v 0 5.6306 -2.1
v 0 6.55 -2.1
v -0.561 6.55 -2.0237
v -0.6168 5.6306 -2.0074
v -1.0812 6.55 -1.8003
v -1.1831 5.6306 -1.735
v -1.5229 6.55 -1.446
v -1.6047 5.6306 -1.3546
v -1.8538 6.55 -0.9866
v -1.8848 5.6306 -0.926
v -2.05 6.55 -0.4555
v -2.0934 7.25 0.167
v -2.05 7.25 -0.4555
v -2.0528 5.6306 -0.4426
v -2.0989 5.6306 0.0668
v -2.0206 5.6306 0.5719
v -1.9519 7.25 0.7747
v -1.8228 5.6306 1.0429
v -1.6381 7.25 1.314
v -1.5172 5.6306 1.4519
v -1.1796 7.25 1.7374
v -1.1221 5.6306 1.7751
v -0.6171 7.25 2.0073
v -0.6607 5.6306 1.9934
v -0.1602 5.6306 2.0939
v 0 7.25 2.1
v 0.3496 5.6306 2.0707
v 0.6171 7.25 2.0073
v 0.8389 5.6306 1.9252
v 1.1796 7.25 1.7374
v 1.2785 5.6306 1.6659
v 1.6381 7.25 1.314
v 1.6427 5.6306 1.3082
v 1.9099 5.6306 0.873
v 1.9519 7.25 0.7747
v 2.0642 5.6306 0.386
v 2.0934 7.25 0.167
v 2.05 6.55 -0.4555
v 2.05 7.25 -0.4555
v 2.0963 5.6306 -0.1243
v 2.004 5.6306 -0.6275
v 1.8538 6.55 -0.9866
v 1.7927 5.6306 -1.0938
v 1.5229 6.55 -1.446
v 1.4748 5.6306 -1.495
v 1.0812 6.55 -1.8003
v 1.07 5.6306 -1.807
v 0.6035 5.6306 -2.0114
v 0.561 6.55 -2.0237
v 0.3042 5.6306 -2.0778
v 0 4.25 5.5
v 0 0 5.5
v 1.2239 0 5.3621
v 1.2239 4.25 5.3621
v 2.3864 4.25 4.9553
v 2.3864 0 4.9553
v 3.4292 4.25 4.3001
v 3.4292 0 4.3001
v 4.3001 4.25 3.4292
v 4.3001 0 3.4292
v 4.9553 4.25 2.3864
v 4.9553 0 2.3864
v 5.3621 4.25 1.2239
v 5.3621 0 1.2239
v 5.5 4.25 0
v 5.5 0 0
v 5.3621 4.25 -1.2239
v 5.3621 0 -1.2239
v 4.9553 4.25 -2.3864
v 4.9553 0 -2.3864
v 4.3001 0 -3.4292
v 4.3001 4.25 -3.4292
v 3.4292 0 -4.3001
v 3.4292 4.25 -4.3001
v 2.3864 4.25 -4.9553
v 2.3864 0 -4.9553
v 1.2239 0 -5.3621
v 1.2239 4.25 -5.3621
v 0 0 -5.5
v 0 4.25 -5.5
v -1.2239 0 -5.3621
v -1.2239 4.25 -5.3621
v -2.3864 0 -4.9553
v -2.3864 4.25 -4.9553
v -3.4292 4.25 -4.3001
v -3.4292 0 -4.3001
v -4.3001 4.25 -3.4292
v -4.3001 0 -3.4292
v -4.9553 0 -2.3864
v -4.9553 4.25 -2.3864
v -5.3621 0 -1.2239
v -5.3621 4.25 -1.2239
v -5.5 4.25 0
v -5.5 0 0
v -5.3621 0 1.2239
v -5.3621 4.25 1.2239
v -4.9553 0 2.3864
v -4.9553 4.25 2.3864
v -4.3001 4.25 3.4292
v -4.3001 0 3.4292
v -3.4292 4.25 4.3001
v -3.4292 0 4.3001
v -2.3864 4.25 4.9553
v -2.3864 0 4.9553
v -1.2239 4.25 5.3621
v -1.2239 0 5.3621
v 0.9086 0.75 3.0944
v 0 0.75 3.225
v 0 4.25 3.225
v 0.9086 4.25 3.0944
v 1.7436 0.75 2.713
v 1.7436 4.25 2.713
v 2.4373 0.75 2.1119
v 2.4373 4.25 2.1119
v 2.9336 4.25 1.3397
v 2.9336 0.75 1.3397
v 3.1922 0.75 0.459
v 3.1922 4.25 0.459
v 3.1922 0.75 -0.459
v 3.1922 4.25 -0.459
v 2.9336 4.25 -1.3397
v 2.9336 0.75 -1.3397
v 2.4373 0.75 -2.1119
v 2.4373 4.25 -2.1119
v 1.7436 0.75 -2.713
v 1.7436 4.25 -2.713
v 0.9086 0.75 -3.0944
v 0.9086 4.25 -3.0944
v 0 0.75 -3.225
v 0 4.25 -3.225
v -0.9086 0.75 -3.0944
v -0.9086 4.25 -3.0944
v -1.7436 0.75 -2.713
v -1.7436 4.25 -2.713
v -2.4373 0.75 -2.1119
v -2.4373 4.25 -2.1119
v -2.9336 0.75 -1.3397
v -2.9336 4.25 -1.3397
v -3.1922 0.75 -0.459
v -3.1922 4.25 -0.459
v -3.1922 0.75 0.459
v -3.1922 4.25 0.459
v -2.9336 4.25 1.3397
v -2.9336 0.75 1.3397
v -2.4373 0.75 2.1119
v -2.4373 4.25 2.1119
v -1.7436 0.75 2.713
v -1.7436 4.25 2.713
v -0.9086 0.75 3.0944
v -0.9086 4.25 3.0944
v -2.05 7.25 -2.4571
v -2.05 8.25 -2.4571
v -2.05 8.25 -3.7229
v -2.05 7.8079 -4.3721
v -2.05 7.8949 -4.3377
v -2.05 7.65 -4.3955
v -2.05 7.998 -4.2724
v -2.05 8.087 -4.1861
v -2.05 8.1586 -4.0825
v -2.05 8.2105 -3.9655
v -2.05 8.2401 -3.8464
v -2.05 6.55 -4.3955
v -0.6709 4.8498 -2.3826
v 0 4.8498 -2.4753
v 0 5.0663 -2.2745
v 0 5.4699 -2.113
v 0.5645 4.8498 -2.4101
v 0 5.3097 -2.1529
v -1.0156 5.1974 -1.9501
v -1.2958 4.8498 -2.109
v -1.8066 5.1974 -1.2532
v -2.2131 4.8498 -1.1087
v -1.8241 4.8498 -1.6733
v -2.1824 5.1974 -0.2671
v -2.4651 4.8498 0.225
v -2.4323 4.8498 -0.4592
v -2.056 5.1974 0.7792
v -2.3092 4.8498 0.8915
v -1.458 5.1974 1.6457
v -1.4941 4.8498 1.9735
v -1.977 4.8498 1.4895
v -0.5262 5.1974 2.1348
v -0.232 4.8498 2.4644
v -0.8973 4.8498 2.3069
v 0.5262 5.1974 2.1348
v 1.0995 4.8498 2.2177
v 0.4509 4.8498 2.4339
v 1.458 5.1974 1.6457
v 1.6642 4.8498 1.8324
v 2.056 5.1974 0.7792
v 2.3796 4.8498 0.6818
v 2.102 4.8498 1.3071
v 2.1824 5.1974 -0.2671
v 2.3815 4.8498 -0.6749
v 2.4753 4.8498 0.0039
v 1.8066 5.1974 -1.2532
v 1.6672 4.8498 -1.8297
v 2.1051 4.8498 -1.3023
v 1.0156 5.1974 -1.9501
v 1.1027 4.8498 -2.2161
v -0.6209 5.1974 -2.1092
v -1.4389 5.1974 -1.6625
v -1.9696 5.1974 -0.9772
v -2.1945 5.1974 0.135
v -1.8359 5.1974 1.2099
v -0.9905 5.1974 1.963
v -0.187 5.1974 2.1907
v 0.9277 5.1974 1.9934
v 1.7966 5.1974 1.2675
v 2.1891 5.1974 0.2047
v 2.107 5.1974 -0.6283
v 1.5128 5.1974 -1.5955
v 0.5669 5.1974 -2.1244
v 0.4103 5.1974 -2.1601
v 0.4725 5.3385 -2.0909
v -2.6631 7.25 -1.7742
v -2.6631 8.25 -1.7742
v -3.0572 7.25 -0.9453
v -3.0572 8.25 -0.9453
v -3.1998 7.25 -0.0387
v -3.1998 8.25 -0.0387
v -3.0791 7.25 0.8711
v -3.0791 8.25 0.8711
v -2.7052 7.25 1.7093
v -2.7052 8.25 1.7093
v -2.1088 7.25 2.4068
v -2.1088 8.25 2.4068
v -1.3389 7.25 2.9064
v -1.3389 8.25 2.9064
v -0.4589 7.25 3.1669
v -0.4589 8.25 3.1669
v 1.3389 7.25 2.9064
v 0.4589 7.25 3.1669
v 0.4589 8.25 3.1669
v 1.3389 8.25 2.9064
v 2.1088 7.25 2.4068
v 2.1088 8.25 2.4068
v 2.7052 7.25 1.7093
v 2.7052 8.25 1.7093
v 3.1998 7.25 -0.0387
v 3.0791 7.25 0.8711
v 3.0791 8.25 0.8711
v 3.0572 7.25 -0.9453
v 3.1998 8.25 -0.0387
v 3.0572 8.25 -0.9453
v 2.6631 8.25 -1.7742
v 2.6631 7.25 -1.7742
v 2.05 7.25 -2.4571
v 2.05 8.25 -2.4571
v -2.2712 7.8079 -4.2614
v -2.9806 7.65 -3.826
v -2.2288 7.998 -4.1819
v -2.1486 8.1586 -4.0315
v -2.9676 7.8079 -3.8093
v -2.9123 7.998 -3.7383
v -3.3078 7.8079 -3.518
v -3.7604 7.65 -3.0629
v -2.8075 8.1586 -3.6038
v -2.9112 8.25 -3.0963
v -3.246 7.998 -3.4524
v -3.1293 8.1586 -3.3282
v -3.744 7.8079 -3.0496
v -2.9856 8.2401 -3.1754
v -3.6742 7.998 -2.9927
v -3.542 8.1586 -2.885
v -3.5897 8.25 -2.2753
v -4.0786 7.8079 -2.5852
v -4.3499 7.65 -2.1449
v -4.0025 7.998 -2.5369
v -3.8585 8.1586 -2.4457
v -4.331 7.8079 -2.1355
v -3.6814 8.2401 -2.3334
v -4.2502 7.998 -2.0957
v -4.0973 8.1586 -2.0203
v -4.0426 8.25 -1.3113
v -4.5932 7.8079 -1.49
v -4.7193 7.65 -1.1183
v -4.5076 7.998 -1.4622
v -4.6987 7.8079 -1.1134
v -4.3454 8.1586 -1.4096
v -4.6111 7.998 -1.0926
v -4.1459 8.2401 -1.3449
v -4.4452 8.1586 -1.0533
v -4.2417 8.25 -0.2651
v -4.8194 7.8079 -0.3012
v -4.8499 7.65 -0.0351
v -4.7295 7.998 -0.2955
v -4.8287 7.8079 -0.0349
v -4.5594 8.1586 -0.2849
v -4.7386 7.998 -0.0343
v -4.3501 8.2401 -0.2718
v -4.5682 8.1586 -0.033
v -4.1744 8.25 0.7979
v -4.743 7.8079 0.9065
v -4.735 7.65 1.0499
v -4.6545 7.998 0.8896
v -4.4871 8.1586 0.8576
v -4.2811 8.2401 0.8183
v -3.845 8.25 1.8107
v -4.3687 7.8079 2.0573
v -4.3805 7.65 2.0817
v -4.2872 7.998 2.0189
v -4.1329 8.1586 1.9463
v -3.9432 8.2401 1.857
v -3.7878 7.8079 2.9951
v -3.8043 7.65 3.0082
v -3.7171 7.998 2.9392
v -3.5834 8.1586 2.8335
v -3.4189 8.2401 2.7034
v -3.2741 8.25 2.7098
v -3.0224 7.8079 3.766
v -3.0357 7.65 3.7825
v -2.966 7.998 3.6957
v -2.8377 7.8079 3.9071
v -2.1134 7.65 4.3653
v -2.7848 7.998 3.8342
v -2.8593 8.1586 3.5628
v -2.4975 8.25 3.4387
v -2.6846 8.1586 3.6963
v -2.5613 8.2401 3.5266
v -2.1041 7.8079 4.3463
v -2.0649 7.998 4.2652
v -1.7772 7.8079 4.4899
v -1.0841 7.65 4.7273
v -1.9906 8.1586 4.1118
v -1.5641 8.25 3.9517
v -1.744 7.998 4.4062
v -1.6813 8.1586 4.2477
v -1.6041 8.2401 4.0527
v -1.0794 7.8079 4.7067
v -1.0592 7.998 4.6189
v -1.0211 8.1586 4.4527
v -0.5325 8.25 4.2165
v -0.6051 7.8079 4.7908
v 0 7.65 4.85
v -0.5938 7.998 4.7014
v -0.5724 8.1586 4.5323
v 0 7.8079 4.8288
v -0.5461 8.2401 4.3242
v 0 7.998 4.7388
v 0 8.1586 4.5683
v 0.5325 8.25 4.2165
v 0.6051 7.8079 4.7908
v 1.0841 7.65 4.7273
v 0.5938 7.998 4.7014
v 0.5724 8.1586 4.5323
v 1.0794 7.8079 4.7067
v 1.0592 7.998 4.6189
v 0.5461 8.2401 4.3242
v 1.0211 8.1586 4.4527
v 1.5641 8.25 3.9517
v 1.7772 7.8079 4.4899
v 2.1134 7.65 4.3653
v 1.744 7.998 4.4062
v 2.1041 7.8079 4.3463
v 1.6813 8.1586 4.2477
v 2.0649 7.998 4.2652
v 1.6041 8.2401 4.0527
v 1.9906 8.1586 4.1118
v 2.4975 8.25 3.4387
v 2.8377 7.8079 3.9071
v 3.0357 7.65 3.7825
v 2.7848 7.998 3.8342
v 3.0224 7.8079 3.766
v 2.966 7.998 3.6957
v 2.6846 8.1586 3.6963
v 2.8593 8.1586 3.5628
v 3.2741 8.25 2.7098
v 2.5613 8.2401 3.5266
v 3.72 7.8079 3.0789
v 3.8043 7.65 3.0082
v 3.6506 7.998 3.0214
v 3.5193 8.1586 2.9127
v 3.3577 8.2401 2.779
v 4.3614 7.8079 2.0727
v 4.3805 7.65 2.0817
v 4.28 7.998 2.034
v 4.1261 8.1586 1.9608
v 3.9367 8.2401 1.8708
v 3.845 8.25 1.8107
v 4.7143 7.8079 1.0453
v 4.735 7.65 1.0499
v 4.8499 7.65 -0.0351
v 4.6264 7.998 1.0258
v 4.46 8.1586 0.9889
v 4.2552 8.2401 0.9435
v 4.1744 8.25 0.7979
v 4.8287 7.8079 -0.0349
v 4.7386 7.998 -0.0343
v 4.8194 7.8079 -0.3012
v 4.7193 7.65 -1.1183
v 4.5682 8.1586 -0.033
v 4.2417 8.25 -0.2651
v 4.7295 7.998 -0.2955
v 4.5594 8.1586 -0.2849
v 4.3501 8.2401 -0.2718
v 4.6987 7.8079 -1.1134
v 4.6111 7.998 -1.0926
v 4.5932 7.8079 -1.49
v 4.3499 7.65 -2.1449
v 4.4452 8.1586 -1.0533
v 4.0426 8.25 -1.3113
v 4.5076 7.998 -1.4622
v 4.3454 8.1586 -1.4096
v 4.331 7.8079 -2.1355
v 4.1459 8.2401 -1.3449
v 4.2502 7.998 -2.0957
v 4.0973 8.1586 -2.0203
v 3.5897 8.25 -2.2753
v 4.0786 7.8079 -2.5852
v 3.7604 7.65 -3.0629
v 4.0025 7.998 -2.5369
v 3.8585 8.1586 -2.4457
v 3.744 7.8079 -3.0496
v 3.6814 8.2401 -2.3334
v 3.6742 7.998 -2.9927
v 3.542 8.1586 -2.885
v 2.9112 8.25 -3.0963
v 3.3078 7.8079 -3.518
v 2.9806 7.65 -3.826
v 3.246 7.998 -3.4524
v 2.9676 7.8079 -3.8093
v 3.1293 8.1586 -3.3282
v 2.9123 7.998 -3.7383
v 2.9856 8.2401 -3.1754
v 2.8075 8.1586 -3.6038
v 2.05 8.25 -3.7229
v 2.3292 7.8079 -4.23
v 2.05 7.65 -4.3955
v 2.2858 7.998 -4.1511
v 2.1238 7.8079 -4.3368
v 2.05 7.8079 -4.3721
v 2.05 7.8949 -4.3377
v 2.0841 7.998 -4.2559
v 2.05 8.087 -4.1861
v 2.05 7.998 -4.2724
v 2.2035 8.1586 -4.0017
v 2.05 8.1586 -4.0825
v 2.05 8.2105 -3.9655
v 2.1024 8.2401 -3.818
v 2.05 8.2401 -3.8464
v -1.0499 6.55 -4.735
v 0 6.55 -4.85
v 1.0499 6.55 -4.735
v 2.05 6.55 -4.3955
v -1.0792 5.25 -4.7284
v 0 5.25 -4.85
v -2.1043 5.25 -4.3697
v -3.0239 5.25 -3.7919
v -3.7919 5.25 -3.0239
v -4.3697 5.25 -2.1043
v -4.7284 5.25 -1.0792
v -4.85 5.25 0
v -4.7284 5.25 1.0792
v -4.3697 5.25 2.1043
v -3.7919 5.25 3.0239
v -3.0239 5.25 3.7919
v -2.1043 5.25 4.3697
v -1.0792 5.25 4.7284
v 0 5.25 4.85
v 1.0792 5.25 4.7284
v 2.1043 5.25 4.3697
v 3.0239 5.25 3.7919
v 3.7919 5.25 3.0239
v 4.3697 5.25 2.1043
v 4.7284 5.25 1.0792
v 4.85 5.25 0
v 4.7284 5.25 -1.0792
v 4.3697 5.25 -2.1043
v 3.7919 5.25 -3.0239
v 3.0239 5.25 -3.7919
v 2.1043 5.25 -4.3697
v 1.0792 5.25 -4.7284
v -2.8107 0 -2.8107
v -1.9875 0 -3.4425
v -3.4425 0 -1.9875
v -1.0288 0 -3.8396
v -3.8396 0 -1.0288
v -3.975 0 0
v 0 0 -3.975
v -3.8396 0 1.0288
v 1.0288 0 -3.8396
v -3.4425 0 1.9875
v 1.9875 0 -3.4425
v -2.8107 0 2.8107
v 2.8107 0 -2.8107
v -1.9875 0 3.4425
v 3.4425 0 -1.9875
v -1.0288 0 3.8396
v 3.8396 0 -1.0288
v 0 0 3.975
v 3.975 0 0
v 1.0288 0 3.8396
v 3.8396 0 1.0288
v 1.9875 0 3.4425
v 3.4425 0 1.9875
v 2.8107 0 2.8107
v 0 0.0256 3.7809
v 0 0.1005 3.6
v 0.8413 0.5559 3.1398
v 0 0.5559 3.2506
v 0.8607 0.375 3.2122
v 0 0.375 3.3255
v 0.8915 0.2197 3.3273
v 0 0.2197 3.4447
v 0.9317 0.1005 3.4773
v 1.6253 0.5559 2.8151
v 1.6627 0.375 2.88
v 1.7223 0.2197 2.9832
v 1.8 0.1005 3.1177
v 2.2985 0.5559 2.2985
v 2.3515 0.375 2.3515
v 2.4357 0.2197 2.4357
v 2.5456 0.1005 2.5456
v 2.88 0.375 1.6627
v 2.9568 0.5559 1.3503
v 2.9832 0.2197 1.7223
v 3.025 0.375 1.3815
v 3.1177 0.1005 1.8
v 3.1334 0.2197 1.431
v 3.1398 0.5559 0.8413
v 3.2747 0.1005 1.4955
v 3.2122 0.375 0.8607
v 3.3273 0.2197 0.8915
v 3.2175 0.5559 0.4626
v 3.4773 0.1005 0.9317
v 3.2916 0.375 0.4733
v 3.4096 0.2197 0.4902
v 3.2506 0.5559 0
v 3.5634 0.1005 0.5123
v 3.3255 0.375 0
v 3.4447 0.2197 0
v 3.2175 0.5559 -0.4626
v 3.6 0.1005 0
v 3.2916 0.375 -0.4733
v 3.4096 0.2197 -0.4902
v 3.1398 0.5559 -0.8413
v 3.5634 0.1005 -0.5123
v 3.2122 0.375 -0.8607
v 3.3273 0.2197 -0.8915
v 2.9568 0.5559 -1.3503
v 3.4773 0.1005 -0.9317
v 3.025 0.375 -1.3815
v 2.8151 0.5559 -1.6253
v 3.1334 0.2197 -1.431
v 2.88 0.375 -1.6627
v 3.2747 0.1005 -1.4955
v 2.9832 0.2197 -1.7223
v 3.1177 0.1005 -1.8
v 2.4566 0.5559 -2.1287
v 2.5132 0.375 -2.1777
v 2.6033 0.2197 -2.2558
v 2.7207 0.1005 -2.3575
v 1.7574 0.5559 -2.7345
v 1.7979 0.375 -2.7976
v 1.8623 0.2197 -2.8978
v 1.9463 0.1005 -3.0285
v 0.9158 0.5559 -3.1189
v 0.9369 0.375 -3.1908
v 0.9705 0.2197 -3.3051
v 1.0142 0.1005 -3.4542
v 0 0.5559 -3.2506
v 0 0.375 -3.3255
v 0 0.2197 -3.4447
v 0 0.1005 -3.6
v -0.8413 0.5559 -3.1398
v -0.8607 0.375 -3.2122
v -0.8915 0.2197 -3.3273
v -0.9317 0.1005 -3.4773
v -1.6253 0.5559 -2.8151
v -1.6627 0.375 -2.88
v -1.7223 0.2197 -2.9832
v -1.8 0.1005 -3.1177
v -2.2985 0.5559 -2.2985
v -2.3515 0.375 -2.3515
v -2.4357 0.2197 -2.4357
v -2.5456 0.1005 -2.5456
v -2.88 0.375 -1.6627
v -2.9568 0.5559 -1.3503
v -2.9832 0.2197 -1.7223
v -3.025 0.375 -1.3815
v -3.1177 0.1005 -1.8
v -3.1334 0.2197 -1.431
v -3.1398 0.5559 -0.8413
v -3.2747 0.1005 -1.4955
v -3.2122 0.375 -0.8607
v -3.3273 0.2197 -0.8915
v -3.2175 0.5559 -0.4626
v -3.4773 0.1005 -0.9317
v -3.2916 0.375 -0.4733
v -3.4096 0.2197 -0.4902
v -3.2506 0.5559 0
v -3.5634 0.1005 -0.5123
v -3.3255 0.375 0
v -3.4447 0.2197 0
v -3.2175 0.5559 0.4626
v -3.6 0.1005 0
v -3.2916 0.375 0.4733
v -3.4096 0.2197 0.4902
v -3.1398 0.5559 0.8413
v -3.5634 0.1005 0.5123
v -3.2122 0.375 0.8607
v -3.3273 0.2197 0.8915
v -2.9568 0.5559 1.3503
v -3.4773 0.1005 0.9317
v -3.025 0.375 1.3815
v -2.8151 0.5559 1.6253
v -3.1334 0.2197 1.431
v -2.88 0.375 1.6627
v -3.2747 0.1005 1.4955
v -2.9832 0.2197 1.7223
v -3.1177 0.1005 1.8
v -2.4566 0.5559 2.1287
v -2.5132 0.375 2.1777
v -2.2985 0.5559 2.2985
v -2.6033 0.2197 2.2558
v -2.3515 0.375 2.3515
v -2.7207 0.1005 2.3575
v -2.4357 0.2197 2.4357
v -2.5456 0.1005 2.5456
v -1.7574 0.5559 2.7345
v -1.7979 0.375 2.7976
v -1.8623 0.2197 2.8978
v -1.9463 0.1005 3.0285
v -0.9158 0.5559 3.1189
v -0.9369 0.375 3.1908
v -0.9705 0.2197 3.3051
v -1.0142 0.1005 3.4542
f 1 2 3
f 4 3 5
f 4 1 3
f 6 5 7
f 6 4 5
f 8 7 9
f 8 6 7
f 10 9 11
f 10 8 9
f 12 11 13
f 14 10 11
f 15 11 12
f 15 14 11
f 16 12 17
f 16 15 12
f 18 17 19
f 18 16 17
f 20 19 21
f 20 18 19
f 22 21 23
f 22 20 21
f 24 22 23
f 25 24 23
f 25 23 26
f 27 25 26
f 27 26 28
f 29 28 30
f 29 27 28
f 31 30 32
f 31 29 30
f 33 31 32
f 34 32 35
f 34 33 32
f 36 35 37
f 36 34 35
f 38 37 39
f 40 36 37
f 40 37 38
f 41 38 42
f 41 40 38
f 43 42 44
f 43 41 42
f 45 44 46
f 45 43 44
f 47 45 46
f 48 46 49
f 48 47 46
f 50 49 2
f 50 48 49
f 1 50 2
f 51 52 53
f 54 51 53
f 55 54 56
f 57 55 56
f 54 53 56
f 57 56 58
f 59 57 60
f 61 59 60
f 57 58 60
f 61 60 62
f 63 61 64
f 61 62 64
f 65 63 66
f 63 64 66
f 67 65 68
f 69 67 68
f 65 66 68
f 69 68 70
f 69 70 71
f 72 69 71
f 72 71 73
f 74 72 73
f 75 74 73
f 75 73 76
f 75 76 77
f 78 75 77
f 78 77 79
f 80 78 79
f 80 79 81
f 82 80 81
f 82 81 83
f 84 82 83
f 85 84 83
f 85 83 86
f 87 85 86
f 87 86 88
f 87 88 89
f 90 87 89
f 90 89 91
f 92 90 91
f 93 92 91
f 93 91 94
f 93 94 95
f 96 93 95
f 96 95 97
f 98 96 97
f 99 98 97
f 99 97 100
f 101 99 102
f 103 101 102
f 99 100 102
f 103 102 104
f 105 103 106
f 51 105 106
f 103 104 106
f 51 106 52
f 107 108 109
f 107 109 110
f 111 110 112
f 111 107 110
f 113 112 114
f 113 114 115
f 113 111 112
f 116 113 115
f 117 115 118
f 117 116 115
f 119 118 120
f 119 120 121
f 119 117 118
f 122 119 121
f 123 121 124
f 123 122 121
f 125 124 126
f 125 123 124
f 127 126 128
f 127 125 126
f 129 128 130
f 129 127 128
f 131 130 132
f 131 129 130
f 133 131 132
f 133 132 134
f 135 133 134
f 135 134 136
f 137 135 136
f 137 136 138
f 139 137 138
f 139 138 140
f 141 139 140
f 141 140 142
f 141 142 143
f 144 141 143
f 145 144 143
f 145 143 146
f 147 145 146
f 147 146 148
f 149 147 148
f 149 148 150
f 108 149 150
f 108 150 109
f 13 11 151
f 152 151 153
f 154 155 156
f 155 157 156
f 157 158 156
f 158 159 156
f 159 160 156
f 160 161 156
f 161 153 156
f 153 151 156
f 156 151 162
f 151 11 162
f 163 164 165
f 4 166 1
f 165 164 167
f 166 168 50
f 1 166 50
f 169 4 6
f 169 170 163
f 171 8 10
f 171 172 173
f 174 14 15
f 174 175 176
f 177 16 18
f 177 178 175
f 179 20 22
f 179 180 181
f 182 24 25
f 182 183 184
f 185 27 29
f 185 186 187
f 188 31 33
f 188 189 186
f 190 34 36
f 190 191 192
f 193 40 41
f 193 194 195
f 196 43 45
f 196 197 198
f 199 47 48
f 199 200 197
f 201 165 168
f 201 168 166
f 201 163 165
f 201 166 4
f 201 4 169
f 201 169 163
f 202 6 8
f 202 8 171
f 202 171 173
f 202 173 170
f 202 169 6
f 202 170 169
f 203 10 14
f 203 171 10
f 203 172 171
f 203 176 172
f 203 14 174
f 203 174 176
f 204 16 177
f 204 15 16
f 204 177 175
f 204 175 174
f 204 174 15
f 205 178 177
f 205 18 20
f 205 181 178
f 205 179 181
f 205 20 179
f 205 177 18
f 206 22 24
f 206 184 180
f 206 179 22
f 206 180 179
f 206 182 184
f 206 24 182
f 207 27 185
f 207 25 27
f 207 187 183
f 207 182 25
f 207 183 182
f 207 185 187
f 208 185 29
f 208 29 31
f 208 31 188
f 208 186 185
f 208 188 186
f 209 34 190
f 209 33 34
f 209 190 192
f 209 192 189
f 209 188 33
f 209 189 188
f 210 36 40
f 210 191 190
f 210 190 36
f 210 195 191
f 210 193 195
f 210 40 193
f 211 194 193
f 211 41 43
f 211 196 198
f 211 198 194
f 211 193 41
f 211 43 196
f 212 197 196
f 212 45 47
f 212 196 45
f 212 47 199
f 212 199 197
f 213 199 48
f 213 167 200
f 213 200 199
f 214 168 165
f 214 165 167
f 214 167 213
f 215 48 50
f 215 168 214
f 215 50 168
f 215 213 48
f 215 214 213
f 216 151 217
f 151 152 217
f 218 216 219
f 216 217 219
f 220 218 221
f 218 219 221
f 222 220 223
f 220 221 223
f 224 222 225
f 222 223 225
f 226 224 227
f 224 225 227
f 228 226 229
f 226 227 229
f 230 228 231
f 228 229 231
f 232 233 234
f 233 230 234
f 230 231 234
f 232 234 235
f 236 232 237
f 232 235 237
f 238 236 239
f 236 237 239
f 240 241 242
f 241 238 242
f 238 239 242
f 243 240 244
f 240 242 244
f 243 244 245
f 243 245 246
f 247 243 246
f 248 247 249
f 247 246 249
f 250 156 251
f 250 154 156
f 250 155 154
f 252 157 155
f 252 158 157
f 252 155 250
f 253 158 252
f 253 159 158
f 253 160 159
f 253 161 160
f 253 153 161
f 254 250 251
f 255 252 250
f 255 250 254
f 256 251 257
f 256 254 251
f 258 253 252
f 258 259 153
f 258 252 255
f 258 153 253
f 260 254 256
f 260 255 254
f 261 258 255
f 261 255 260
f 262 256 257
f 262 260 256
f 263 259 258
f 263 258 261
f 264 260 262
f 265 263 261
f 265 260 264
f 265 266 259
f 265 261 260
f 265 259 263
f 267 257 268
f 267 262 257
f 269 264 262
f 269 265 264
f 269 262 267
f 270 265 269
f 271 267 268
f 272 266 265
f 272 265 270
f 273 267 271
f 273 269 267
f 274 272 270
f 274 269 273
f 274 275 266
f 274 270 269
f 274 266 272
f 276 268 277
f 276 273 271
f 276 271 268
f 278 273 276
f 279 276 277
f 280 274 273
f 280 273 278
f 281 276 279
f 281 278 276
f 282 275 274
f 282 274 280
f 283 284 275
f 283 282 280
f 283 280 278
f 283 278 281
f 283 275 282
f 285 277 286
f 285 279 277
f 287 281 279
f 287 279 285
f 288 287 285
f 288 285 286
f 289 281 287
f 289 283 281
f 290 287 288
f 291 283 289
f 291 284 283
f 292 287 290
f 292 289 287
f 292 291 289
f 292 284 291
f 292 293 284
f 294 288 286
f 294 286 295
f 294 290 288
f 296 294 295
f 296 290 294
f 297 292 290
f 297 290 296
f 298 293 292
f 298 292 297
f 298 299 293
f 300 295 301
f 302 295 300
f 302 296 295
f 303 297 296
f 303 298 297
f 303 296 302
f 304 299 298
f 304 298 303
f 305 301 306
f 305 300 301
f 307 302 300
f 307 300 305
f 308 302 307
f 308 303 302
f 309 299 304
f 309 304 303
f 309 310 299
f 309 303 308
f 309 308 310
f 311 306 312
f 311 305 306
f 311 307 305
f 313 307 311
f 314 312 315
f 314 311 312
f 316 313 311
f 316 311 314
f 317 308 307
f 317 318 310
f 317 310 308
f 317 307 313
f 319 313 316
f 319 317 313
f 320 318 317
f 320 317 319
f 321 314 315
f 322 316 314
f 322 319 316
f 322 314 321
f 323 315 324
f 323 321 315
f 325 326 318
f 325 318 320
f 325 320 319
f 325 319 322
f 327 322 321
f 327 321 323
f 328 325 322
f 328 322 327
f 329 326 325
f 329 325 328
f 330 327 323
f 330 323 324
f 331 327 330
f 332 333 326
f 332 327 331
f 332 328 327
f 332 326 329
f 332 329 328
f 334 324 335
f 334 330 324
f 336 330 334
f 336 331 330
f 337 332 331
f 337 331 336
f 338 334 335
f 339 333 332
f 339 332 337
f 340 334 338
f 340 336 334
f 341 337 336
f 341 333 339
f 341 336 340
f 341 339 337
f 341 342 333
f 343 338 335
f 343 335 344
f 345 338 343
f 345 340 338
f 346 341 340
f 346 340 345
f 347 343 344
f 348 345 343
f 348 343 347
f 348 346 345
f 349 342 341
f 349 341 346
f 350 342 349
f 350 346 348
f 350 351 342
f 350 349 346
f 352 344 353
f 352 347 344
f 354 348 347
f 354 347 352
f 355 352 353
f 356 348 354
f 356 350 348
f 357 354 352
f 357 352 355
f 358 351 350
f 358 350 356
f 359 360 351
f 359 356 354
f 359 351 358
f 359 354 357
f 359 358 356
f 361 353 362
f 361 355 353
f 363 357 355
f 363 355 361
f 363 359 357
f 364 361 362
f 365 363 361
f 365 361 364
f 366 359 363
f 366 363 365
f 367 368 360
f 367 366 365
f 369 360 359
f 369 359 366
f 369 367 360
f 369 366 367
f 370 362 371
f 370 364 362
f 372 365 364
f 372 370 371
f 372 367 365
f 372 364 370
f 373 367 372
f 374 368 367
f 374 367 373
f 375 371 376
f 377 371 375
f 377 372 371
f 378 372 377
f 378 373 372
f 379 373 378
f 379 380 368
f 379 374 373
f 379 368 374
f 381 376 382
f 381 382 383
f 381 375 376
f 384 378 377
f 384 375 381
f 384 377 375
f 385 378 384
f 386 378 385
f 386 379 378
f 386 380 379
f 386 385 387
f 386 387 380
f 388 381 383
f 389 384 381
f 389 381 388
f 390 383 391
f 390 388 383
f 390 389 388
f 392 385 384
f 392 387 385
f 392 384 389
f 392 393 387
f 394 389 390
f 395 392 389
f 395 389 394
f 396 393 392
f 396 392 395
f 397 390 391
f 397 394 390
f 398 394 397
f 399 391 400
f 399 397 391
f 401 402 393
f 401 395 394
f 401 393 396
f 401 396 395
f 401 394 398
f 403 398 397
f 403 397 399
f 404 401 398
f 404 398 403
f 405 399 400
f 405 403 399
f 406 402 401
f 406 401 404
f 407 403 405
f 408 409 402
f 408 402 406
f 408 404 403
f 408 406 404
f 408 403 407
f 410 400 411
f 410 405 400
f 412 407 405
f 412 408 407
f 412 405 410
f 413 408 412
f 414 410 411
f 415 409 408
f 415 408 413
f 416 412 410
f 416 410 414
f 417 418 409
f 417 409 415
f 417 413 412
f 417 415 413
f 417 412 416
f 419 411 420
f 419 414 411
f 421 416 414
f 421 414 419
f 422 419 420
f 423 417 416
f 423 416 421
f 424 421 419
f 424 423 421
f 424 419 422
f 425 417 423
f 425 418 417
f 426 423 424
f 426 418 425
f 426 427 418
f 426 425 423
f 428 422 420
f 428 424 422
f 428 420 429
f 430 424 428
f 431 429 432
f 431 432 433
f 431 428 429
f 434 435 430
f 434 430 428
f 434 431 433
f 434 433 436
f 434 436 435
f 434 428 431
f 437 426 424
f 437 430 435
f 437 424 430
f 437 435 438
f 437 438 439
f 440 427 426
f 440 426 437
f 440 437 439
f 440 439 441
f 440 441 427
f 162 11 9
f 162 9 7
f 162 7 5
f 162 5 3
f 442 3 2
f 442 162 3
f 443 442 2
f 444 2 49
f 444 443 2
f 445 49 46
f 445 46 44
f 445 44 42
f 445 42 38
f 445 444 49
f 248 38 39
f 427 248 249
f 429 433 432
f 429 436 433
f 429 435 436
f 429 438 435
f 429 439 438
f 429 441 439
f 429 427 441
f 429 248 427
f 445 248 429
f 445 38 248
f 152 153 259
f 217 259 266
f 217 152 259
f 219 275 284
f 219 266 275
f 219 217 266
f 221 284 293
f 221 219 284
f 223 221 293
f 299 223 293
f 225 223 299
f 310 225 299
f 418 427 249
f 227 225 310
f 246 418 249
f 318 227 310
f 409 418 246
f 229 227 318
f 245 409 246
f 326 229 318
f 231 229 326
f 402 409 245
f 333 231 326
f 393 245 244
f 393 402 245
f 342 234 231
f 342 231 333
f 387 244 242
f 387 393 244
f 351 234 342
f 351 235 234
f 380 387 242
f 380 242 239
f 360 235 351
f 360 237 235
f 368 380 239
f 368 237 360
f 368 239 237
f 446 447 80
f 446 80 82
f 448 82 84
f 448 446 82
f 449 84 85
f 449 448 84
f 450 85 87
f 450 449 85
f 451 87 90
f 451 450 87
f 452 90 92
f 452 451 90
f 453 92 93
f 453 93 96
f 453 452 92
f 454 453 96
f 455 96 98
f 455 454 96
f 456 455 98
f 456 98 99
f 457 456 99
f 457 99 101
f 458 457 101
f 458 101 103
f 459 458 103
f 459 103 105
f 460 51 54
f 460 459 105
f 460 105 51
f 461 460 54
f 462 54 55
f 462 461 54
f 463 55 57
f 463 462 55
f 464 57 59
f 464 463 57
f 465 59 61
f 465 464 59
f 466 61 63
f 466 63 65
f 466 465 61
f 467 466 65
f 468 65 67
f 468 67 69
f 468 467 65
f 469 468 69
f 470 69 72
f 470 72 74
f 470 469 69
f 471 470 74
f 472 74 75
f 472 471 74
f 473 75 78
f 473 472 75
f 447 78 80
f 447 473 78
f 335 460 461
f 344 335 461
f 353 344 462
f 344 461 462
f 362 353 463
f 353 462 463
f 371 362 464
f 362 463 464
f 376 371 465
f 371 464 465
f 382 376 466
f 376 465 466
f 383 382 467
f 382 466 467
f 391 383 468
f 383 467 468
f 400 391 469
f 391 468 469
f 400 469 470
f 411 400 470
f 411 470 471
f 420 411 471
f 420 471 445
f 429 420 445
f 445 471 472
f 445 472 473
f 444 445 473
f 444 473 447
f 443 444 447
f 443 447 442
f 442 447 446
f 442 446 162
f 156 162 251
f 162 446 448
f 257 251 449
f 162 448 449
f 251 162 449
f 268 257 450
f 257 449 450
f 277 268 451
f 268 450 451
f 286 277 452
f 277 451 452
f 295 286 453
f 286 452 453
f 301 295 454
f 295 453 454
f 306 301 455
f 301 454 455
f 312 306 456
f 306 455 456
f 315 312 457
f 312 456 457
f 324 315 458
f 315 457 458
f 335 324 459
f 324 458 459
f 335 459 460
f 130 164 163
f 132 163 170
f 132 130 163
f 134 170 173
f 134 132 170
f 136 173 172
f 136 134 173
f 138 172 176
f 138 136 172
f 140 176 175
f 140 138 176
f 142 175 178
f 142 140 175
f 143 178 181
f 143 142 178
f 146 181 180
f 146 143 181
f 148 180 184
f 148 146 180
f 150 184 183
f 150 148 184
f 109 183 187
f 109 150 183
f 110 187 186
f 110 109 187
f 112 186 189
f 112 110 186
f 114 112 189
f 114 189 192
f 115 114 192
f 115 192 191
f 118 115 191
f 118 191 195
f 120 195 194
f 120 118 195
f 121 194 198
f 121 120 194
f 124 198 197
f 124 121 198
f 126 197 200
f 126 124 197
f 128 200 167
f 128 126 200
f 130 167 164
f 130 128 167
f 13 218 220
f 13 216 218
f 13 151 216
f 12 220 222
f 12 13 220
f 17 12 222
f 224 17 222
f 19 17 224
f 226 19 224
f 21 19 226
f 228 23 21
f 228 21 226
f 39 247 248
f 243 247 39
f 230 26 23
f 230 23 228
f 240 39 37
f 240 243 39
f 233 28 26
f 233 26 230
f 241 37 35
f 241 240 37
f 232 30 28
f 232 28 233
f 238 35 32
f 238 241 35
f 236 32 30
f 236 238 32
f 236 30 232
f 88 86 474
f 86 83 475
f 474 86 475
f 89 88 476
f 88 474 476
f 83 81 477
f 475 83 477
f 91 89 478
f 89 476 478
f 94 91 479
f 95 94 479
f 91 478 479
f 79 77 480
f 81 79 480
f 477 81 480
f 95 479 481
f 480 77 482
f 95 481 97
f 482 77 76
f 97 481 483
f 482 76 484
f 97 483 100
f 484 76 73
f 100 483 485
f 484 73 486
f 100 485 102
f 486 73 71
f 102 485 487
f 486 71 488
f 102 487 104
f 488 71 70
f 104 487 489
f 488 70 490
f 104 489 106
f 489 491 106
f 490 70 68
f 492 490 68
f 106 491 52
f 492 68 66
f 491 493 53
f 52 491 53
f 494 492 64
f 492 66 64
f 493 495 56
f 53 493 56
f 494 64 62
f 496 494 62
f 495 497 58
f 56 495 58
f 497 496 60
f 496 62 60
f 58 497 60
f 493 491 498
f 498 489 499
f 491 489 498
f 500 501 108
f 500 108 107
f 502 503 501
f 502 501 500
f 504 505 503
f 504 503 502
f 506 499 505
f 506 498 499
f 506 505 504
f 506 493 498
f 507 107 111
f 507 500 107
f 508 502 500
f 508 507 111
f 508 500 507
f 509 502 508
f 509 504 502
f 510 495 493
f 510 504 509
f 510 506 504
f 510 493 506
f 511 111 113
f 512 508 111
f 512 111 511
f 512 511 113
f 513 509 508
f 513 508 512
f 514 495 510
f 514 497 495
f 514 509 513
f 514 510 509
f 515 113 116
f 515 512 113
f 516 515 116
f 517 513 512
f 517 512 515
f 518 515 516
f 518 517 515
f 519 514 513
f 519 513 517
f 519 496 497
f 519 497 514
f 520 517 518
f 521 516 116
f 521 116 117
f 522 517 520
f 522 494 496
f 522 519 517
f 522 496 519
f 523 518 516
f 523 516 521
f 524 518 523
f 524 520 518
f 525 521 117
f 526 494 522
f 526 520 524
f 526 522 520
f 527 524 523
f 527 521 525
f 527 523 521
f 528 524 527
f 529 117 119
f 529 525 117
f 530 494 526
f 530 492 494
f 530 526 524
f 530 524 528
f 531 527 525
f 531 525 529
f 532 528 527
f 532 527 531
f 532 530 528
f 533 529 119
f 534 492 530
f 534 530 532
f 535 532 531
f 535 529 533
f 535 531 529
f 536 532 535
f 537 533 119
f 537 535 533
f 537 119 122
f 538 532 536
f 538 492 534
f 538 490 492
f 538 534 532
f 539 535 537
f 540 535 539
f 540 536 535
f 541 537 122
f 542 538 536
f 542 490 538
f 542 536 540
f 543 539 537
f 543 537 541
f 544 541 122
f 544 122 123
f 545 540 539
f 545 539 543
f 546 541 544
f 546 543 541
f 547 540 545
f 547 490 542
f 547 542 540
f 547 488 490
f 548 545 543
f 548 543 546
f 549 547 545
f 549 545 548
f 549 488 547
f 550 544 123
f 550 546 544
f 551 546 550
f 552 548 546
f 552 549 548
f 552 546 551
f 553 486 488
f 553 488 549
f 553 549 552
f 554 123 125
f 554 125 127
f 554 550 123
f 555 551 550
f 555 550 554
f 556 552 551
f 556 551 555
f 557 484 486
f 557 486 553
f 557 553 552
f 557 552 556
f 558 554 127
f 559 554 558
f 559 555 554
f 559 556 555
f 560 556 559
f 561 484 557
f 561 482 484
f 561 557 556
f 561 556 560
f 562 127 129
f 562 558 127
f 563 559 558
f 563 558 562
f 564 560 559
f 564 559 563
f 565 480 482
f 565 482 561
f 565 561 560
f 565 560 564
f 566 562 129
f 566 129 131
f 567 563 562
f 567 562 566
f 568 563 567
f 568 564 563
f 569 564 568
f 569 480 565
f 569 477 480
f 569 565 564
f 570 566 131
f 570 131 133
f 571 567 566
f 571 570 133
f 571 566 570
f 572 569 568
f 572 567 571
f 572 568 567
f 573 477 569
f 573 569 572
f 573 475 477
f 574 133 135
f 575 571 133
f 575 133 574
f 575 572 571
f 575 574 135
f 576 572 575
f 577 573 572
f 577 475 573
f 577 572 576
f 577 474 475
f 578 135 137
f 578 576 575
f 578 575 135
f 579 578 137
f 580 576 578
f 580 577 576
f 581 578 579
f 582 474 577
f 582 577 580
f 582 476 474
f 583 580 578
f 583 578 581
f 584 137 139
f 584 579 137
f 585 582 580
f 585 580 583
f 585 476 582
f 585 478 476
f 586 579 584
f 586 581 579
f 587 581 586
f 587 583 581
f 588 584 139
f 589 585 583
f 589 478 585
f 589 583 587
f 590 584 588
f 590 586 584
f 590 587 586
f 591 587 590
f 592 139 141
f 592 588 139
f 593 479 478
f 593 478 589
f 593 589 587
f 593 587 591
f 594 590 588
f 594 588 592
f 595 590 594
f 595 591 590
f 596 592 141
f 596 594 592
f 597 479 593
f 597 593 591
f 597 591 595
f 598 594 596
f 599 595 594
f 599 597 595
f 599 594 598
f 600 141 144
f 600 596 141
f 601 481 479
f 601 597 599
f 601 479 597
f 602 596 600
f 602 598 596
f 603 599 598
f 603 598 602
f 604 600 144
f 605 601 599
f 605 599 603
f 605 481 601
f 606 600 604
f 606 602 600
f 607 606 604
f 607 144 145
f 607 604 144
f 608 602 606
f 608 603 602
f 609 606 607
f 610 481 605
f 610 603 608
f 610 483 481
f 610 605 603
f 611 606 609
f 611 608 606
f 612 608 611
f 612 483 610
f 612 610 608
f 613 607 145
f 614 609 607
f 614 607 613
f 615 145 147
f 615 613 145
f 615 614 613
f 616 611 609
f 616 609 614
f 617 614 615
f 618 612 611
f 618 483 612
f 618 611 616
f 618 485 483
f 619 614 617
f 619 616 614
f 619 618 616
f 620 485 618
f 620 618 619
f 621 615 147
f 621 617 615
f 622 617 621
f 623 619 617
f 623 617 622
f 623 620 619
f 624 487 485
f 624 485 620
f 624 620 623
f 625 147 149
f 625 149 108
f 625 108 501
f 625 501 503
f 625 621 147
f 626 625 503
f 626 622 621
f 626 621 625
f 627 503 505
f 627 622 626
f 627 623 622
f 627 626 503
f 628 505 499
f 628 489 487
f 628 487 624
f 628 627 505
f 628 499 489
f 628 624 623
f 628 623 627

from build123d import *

# Parameters (mm, degrees)
CROQUIS1_R              = 5.5
CROQUIS1_R_2            = 3.225
SALIENTE_EXTRUIR1_DEPTH = 4.25
CROQUIS3_R              = 4.85
CROQUIS3_R_2            = 2.1
SALIENTE_EXTRUIR2_DEPTH = 3
REDONDEO1_R             = 0.6
CROQUIS4_R              = 3.2
CORTAR_EXTRUIR1_DEPTH   = 1
CORTAR_EXTRUIR2_START   = -0.7
CROQUIS5_W              = 4.1
CROQUIS5_H              = 5
CORTAR_EXTRUIR2_DEPTH   = 12.333085159
REDONDEO2_R             = 1
REDONDEO3_R             = 0.75


with BuildPart() as part:
    # Croquis1 → Saliente-Extruir1 (new body)
    with BuildSketch(Plane(origin=(0, 0, 0), x_dir=(1, 0, 0), z_dir=(0, 1, 0))):
        with Locations(Location((0, 0, 0), (0, 0, 270))):
            Circle(CROQUIS1_R)
        with Locations(Location((0, 0, 0), (0, 0, 270))):
            Circle(CROQUIS1_R_2, mode=Mode.SUBTRACT)
    extrude(amount=SALIENTE_EXTRUIR1_DEPTH)

    # Croquis2 → Revolución1 (revolve)
    with BuildSketch(Plane.XY, mode=Mode.PRIVATE) as revoluci_n1_sk:
        Polygon((-5.5, 4.25), (-4.85, 5.25), (-2.1, 5.25), (-2.1, 5.15), (-3.225, 4.25), align=None)
    revolve(revoluci_n1_sk.sketch.rotate(Axis((0, 0, 0), (0, 1, 0)), 270), axis=Axis((0, 0, 0), (0, 1, 0)))

    # Croquis3 → Saliente-Extruir2 (add)
    with BuildSketch(Plane(origin=(0, 5.25, 0), x_dir=(1, 0, 0), z_dir=(0, 1, 0))):
        with Locations(Location((0, 0, 0), (0, 0, 270))):
            Circle(CROQUIS3_R)
        with Locations(Location((0, 0, 0), (0, 0, 90))):
            Circle(CROQUIS3_R_2, mode=Mode.SUBTRACT)
    extrude(amount=SALIENTE_EXTRUIR2_DEPTH)

    # Redondeo1
    redondeo1_edges = [part.edges().sort_by_distance(p)[0] for p in [
        (0, 8.25, -4.85),
    ]]
    fillet(redondeo1_edges, radius=REDONDEO1_R)

    # Croquis4 → Cortar-Extruir1 (cut)
    with BuildSketch(Plane(origin=(0, 8.25, 0), x_dir=(1, 0, 0), z_dir=(0, 1, 0))):
        with Locations(Location((0, 0, 0), (0, 0, 270))):
            Circle(CROQUIS4_R)
    extrude(amount=-CORTAR_EXTRUIR1_DEPTH, mode=Mode.SUBTRACT)

    # Croquis5 → Cortar-Extruir2 (cut, through all)
    with BuildSketch(Plane(origin=(0, 7.25, 0), x_dir=(1, 0, 0), z_dir=(0, 1, 0)).offset(CORTAR_EXTRUIR2_START)):
        with Locations((0, 2.503070431)):
            Rectangle(CROQUIS5_W, CROQUIS5_H)
    extrude(amount=CORTAR_EXTRUIR2_DEPTH, mode=Mode.SUBTRACT)

    # Redondeo2
    redondeo2_edges = [part.edges().sort_by_distance(p)[0] for p in [
        (0, 5.15, 2.1),
    ]]
    fillet(redondeo2_edges, radius=REDONDEO2_R)

    # Redondeo3
    redondeo3_edges = [part.edges().sort_by_distance(p)[0] for p in [
        (0, 0, -3.225),
    ]]
    fillet(redondeo3_edges, radius=REDONDEO3_R)


solid = part.part
